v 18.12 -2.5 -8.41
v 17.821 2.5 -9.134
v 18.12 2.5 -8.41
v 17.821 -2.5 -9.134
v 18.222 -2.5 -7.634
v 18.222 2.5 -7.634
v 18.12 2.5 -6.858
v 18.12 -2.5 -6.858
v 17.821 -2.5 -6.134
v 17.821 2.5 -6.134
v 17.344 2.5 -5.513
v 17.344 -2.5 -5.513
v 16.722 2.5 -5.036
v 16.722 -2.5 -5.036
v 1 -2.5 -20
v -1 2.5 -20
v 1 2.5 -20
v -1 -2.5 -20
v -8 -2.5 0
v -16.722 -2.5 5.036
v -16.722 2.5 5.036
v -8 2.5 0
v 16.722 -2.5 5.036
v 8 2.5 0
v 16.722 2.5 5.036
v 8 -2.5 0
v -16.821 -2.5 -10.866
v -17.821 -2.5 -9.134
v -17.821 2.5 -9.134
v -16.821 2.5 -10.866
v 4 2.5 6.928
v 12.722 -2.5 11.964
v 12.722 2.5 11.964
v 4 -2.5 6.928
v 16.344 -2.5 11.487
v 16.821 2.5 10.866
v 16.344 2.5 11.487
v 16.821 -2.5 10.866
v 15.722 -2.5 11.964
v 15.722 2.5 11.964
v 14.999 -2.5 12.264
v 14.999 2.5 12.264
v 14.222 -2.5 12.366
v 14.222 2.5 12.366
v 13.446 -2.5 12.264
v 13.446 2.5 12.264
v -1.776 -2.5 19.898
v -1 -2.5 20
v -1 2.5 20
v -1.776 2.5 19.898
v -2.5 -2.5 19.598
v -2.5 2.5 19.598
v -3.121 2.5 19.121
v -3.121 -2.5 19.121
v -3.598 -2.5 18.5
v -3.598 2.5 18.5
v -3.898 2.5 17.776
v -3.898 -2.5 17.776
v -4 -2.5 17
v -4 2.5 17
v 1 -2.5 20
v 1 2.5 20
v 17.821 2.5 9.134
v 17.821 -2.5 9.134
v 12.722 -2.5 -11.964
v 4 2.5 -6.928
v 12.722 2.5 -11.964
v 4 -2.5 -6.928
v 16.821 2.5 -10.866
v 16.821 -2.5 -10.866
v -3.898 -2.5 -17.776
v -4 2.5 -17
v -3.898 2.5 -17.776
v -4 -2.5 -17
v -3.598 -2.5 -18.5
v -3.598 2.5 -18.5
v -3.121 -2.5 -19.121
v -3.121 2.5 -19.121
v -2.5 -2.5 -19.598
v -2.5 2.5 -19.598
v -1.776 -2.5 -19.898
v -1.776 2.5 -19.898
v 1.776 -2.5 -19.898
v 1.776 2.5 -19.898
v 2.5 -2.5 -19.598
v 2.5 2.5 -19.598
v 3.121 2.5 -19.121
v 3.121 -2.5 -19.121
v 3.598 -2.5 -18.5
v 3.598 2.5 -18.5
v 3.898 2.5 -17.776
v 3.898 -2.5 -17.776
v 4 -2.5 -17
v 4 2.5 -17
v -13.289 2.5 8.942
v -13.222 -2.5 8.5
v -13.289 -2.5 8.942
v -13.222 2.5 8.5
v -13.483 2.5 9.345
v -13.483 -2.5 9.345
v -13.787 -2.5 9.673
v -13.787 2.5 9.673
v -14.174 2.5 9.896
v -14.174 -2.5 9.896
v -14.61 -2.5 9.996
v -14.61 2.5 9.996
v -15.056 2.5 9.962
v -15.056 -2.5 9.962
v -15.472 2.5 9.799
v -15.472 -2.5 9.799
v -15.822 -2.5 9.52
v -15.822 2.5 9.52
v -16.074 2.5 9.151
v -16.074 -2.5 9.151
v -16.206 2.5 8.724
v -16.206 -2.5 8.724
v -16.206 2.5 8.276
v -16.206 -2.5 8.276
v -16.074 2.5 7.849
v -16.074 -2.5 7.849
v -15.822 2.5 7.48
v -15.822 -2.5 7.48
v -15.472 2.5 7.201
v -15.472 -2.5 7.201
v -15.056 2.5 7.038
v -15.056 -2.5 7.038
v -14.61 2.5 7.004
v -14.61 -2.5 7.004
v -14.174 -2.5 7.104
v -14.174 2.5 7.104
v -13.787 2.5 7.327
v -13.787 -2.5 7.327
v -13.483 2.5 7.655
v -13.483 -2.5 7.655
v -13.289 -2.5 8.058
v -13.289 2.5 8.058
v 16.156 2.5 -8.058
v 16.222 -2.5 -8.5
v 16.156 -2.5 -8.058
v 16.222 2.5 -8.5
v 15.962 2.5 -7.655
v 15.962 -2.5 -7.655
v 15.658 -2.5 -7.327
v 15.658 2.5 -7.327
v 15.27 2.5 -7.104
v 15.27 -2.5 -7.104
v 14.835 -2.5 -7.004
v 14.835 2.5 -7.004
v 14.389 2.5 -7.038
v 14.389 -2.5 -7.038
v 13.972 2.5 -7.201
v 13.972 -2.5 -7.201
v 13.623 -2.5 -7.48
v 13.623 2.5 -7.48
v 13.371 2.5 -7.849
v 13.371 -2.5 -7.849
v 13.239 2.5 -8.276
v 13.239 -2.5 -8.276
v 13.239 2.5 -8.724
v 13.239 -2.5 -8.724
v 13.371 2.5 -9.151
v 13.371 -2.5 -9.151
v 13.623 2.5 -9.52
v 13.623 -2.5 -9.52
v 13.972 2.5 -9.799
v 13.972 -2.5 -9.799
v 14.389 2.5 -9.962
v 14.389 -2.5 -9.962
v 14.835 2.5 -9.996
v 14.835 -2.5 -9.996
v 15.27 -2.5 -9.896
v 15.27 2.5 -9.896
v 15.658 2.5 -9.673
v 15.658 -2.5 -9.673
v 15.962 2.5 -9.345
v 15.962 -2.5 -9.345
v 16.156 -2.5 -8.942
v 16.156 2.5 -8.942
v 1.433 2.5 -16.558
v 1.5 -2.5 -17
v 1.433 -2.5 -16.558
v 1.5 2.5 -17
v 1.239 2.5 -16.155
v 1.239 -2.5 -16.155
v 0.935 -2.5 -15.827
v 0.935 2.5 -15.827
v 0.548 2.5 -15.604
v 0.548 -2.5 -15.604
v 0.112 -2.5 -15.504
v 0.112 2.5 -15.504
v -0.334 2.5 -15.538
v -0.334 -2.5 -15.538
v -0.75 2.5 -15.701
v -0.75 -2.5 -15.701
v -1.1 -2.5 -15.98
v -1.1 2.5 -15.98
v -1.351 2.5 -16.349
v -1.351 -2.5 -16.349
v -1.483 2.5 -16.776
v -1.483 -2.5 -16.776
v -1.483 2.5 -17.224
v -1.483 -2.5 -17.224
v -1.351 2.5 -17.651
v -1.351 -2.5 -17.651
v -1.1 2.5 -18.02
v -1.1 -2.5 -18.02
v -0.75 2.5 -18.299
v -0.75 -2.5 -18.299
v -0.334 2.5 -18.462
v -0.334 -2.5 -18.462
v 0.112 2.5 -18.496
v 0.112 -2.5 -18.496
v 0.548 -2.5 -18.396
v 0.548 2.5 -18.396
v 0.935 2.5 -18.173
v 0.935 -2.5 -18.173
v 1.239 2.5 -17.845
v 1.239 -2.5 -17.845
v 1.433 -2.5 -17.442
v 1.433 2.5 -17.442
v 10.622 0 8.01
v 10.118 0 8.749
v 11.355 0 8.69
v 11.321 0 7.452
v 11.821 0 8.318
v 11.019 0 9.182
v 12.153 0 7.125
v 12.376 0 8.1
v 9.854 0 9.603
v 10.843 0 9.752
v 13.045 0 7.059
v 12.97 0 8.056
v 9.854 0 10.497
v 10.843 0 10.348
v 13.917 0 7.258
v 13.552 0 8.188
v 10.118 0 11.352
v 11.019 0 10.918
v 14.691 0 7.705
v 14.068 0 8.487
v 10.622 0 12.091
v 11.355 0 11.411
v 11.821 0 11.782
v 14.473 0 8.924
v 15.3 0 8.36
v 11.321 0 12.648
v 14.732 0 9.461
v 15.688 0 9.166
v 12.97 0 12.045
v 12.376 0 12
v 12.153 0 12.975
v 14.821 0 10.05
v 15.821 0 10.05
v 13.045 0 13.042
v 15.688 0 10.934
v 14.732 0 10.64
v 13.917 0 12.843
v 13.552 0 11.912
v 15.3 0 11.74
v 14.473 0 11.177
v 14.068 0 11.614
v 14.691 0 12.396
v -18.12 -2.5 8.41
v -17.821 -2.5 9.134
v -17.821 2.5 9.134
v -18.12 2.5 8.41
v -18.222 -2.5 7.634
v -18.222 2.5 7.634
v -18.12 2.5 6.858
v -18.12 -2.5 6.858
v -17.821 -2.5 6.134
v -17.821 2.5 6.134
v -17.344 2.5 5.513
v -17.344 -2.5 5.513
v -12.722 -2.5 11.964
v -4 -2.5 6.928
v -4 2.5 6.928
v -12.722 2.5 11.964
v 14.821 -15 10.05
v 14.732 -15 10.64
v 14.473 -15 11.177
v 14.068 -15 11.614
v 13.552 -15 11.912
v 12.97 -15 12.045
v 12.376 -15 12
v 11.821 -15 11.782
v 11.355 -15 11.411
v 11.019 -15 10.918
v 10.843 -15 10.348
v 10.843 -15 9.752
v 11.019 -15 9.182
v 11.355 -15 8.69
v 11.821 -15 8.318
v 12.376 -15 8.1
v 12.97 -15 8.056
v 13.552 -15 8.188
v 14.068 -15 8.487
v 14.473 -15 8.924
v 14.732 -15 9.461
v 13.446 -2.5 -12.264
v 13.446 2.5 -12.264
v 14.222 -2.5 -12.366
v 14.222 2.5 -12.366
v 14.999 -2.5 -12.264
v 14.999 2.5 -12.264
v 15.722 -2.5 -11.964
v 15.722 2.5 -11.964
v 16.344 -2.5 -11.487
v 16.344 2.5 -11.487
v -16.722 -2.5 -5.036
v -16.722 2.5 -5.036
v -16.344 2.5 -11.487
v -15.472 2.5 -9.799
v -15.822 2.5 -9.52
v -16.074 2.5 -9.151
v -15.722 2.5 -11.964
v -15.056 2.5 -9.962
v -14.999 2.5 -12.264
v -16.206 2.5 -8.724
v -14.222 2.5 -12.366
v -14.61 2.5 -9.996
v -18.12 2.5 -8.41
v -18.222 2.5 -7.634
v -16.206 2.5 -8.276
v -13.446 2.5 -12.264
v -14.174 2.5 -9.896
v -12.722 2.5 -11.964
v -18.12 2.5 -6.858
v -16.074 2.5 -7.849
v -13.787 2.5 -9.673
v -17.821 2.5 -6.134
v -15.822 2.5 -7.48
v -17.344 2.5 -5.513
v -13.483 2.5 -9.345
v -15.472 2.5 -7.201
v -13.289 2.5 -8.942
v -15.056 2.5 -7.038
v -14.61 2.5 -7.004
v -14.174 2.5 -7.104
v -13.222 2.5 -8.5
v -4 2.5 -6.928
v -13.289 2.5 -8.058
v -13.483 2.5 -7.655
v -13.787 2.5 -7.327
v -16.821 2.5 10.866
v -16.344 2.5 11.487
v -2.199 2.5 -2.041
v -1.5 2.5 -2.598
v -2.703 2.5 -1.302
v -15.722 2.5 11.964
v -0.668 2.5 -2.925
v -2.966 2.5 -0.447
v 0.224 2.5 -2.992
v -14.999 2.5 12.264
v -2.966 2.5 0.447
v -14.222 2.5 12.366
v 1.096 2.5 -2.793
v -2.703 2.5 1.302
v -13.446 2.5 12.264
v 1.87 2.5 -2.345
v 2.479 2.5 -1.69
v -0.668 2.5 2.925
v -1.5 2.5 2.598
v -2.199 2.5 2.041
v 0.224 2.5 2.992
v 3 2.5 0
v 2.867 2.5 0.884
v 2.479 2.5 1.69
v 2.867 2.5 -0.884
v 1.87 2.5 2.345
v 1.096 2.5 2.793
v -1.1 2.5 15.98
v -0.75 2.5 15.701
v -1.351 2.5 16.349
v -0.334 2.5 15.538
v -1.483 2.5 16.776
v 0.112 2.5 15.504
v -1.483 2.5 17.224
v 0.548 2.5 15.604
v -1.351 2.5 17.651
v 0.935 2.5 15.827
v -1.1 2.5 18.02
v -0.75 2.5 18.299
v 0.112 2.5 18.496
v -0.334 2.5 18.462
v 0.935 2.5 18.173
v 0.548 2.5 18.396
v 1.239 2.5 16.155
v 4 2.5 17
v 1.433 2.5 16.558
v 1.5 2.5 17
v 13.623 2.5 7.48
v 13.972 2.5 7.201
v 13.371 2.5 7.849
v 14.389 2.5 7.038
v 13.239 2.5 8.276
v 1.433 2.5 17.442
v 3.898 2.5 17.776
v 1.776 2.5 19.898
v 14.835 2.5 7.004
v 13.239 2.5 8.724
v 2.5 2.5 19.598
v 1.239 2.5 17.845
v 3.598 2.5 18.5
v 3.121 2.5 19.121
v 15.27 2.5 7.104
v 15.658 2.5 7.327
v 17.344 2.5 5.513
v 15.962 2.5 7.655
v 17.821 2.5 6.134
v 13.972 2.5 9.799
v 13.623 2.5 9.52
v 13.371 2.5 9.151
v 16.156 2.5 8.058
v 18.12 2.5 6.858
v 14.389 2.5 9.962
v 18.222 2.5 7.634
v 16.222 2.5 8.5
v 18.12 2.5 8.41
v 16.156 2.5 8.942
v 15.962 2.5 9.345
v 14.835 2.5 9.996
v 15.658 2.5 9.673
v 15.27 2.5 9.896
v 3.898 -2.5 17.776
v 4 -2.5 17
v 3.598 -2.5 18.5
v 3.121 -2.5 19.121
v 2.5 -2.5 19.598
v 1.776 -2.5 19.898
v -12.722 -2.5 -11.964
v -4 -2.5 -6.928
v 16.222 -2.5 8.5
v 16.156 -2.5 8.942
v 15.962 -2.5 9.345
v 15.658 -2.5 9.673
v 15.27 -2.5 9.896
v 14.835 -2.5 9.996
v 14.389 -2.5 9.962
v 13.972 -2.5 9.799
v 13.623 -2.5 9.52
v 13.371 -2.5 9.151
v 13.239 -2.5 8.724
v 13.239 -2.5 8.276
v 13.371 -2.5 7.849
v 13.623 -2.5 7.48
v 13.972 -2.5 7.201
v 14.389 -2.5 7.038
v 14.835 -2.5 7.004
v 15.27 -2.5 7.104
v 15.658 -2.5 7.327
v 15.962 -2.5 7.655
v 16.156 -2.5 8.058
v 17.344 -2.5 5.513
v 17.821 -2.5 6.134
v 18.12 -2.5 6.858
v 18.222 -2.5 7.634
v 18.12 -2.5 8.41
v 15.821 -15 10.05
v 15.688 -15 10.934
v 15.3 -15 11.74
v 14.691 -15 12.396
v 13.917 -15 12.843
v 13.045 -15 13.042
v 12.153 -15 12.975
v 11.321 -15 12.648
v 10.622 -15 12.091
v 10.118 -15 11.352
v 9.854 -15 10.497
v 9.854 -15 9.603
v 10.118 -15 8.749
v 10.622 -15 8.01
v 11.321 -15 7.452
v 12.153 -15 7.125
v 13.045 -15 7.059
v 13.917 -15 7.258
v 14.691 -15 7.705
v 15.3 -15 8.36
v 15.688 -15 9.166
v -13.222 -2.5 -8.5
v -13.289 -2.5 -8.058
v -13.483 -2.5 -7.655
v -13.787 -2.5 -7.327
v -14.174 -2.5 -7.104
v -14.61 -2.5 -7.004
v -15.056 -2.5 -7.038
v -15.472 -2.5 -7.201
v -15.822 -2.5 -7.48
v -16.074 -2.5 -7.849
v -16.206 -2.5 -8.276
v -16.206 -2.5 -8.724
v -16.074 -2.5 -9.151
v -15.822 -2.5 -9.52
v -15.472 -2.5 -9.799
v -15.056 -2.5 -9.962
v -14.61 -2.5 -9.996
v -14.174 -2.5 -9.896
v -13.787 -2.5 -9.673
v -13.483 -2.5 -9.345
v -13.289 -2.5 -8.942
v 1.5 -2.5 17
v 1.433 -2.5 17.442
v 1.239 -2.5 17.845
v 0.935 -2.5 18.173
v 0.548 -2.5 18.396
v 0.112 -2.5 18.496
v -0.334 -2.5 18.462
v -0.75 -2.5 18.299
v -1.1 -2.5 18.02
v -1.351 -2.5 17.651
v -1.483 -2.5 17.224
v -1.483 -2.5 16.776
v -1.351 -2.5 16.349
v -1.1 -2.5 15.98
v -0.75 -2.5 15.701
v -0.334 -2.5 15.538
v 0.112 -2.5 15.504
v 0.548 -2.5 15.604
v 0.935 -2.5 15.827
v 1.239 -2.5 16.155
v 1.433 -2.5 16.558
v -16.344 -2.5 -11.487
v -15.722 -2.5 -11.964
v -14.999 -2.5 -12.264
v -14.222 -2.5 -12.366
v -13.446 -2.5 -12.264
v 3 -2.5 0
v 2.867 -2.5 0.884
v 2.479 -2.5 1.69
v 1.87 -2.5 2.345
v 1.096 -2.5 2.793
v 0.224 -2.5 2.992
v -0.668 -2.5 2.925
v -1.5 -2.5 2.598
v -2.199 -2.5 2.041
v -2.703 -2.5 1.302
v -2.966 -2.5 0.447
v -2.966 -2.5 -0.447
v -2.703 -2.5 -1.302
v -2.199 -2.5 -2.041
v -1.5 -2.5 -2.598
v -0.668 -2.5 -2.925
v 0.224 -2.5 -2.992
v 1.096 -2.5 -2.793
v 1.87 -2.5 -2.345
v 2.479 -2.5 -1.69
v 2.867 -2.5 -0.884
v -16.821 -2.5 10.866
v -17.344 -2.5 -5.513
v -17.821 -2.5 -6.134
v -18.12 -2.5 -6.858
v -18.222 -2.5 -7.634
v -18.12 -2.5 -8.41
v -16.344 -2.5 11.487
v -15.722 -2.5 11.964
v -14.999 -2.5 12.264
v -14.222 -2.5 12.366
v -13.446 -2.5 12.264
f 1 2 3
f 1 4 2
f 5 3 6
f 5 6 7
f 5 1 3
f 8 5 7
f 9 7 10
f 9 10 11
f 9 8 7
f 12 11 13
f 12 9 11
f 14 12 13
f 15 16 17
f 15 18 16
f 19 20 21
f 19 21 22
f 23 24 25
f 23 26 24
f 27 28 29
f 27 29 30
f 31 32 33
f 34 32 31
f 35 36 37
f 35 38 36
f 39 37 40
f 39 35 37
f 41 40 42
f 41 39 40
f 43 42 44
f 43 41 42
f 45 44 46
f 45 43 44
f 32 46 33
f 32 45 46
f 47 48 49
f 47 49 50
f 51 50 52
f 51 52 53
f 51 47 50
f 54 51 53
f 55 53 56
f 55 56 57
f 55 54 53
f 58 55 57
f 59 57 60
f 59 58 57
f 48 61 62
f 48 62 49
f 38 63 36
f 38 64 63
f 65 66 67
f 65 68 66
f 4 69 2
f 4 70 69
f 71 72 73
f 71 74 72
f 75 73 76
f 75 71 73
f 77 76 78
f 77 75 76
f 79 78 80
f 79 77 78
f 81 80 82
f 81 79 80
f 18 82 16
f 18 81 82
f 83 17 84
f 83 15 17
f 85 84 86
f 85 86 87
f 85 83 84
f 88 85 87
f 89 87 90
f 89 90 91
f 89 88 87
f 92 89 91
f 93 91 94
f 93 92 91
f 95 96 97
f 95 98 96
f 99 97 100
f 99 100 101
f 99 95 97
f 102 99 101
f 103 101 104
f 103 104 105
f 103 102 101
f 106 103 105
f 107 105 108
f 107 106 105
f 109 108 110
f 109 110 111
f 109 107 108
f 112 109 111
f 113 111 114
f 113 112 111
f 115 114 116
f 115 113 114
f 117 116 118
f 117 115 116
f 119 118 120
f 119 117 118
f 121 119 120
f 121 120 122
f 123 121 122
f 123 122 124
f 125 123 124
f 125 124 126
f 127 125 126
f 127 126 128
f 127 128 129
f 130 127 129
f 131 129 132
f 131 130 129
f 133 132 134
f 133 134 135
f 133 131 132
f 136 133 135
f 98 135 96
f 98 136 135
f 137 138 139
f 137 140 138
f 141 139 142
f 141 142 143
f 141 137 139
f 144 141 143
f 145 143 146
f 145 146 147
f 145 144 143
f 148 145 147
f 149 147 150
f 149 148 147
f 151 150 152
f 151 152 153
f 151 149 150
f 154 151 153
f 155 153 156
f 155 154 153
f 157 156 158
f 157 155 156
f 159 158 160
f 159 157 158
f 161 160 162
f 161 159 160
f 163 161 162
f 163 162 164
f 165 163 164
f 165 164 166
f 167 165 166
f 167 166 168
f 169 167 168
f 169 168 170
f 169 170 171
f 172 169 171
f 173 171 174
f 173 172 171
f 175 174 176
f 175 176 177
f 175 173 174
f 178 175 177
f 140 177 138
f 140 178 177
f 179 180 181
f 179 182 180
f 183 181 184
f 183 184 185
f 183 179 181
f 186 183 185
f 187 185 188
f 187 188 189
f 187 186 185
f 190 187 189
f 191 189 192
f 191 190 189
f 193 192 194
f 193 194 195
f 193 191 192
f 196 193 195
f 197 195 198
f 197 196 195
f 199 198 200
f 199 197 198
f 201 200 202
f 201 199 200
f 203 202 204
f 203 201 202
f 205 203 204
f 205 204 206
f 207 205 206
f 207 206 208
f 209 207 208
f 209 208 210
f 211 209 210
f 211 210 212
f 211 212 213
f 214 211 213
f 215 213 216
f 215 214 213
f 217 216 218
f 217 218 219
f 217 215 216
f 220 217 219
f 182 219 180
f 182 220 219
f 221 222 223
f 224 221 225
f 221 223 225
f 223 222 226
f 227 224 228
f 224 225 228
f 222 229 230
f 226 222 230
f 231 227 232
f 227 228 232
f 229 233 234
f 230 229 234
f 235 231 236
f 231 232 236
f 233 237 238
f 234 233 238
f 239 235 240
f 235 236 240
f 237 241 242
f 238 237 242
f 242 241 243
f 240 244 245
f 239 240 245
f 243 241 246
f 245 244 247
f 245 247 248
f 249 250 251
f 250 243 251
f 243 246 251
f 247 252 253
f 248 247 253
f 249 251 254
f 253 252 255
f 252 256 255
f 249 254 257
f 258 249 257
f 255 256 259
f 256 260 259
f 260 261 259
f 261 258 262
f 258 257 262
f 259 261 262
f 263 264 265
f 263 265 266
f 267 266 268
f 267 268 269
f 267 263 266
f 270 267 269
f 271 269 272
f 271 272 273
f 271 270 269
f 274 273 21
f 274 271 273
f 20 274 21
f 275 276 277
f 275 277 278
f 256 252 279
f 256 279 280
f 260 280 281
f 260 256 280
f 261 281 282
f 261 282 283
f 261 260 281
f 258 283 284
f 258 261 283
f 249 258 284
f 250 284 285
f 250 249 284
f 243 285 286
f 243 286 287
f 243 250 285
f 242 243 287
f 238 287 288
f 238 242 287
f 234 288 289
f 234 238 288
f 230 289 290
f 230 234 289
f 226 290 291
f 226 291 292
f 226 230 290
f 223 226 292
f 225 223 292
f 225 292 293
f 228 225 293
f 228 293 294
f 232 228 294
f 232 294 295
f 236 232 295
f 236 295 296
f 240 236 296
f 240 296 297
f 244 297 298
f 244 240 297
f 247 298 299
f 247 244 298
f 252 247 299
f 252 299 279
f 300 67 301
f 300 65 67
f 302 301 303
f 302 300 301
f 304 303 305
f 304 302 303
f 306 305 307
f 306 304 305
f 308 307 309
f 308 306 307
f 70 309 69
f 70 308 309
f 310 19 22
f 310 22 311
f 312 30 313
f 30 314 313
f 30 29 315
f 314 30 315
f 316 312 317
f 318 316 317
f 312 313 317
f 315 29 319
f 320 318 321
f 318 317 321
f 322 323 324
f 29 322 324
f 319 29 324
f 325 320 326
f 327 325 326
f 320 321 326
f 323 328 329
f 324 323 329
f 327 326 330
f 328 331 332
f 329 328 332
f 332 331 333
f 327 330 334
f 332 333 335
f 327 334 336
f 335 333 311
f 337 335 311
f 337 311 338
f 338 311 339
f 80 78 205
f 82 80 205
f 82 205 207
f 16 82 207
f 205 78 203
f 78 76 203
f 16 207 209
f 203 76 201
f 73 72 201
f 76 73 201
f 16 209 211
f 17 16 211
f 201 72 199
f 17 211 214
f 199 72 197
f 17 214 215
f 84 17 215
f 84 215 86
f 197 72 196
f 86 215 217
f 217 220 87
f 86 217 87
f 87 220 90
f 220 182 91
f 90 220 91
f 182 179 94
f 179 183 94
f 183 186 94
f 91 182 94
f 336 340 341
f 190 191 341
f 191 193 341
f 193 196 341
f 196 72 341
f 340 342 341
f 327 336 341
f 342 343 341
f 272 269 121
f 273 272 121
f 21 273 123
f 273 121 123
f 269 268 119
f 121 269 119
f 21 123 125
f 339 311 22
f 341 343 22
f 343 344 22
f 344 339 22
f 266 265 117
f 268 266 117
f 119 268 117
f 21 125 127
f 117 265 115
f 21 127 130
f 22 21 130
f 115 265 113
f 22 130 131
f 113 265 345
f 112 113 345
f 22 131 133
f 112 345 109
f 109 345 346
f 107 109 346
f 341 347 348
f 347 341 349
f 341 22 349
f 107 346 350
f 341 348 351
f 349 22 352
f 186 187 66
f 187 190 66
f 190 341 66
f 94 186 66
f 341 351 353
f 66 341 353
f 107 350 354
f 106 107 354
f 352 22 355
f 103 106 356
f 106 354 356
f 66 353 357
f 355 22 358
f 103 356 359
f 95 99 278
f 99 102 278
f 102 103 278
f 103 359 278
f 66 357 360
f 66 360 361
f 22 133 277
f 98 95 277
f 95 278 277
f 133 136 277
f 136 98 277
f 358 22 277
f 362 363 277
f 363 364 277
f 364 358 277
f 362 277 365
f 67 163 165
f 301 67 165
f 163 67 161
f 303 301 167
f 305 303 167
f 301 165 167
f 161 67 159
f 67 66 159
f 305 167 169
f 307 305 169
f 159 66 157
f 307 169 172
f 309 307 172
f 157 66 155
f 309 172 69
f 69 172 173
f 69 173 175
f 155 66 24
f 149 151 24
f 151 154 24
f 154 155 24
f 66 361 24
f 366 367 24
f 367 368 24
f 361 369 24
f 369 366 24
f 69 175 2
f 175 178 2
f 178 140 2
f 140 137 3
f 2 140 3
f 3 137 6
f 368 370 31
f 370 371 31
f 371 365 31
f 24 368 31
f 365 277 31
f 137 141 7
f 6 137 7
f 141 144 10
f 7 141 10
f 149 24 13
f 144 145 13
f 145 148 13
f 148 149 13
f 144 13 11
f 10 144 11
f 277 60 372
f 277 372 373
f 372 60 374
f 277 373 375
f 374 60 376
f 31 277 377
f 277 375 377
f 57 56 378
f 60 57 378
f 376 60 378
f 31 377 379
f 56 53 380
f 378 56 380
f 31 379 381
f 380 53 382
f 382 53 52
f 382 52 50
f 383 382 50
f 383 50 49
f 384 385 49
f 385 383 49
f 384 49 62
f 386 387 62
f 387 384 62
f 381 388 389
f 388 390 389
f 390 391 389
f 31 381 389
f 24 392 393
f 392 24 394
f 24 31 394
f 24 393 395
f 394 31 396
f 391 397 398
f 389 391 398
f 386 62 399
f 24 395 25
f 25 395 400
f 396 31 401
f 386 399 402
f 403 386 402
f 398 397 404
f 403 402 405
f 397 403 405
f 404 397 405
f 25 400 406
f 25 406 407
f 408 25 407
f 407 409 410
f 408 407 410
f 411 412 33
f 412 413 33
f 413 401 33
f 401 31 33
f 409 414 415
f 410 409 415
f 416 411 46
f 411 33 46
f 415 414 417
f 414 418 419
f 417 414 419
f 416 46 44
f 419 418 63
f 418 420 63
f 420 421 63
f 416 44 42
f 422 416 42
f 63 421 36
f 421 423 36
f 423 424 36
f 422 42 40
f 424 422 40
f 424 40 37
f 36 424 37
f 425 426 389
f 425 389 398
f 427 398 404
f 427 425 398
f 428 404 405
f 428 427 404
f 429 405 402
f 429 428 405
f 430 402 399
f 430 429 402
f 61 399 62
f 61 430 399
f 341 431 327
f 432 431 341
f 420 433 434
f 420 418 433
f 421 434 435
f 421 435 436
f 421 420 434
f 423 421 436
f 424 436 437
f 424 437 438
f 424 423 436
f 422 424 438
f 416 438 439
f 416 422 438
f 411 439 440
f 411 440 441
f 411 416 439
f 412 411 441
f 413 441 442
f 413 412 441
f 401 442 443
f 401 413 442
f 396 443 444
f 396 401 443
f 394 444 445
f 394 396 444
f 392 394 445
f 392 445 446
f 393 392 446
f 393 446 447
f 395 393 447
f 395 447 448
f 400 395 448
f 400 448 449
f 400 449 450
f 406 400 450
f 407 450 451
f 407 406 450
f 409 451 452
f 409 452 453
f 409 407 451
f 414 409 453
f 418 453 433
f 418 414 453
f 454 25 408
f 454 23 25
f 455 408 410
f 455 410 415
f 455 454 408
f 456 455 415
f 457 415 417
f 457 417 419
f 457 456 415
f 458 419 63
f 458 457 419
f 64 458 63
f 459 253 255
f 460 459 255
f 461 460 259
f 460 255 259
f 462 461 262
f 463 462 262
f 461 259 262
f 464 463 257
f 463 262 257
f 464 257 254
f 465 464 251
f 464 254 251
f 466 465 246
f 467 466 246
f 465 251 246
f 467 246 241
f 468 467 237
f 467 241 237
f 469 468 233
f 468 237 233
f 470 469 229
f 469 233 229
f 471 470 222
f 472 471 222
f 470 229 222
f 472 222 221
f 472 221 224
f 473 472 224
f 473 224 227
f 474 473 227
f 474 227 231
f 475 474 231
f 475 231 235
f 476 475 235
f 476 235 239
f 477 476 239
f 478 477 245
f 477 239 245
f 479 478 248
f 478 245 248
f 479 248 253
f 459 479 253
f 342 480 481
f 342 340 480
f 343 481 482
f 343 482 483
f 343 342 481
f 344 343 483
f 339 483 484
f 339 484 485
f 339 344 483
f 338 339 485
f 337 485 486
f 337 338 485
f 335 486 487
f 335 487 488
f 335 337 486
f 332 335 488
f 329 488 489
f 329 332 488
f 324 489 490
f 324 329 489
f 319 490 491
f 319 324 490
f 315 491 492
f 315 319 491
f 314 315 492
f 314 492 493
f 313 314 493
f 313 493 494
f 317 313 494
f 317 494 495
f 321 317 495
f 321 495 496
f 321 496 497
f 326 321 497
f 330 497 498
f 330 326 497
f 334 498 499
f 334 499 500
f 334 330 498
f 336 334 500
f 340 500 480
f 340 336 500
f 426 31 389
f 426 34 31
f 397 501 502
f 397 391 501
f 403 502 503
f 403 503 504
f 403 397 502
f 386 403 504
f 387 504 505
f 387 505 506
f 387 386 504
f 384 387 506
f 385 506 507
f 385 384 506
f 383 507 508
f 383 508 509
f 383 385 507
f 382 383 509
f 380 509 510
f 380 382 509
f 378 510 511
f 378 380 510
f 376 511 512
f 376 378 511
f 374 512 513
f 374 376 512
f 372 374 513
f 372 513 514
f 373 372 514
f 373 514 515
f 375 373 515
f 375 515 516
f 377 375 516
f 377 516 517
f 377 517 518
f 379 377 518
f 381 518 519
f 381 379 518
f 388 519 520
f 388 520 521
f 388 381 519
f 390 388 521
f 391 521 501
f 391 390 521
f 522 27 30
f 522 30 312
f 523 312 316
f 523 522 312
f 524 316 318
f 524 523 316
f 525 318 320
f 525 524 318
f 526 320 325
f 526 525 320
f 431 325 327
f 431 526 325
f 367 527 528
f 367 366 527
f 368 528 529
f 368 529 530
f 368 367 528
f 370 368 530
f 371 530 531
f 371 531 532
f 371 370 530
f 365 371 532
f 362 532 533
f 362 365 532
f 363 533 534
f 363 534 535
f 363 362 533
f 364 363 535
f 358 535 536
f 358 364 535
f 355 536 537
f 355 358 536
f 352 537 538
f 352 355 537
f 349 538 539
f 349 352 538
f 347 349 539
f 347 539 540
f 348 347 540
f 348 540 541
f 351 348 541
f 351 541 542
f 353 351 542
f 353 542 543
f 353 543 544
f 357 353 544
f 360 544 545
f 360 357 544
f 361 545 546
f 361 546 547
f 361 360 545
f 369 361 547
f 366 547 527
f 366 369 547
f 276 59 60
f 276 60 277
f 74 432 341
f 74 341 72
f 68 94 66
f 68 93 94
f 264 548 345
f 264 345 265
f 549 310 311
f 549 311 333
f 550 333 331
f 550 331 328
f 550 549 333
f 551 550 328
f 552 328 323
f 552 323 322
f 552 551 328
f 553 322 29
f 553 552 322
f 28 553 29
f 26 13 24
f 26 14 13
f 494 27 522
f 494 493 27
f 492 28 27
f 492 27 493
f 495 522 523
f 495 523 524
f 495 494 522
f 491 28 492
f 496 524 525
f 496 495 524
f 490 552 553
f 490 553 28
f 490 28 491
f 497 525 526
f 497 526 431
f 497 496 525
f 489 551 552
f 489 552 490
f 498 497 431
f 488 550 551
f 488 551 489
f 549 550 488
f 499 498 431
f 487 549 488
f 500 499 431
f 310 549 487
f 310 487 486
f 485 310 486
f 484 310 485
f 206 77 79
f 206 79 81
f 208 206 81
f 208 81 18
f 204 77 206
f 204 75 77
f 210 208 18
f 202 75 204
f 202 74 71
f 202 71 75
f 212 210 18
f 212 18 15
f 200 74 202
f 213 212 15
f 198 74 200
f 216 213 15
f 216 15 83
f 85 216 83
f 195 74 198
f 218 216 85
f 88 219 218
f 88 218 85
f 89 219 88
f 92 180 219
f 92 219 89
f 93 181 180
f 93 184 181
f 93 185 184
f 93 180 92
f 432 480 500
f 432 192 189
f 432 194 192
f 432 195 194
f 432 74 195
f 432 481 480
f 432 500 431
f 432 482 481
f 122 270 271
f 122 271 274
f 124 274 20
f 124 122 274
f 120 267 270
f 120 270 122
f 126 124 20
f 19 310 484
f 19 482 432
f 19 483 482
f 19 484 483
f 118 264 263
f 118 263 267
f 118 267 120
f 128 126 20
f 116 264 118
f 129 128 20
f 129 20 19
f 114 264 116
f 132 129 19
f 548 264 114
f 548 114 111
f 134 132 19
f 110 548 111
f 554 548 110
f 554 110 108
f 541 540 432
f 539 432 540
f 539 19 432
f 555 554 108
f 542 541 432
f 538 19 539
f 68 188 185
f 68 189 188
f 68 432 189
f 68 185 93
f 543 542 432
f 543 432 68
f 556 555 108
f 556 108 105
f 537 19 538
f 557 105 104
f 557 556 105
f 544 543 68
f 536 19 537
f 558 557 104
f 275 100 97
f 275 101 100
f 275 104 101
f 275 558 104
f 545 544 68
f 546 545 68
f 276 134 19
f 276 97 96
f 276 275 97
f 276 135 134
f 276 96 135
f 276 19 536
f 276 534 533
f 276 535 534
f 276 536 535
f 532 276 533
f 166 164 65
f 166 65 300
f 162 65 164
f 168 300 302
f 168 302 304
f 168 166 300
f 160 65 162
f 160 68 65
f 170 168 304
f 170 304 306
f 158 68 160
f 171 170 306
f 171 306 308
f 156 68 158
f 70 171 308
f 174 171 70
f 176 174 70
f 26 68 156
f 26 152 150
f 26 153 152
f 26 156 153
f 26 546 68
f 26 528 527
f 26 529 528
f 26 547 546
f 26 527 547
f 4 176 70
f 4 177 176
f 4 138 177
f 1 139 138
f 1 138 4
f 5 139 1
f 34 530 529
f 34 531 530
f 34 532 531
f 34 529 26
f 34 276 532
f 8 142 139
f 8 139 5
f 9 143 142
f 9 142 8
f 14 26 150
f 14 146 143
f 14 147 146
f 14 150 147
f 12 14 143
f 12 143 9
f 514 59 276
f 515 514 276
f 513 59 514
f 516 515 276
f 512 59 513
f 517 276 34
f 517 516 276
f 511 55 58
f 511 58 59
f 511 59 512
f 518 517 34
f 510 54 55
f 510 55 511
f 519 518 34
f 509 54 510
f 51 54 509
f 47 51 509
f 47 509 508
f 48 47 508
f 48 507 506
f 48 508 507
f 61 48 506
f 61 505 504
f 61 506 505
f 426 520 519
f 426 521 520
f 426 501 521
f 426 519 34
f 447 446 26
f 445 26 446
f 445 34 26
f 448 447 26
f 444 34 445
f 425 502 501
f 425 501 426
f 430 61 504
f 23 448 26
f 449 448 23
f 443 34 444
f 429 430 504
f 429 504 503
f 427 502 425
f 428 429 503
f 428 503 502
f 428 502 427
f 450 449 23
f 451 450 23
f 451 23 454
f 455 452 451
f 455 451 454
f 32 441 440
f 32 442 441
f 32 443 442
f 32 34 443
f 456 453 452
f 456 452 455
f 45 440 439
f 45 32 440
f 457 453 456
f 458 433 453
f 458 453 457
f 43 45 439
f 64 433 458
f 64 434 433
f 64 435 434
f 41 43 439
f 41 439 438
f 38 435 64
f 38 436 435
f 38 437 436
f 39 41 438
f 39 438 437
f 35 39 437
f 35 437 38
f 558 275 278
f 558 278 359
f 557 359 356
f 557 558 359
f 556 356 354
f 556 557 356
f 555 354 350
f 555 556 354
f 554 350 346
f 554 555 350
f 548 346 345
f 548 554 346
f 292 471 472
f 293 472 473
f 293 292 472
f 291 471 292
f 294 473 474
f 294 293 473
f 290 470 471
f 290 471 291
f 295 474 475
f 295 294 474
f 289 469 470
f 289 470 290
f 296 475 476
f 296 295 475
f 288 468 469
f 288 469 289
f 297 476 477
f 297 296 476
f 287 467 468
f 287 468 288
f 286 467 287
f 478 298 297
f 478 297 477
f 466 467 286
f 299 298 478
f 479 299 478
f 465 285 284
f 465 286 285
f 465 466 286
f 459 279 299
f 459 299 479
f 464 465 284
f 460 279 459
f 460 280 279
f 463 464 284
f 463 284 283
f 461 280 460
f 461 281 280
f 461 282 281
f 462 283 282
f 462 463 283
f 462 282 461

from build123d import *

# Parameters (mm, degrees)
F0_R     = 1.5
F0_R_2   = 3
F1_DEPTH = 2.5
F2_R     = 4.5
F2_R_2   = 3
F3_DEPTH = 5.5
F5_R     = 3
F5_R_2   = 2
F6_DEPTH = 15


with BuildPart() as f1:
    # F0 (on Front) → F1 (new body, symmetric)
    with BuildSketch(Plane.XZ):
        with BuildLine():
            Line((4, 6.928203), (4, 17))
            ThreePointArc((4, 17), (3.12132, 19.12132), (1, 20))
            Line((1, 20), (-1, 20))
            ThreePointArc((-1, 20), (-3.12132, 19.12132), (-4, 17))
            Line((-4, 17), (-4, 6.928203))
            Line((-4, 6.928203), (-12.722432, 11.964102))
            ThreePointArc((-12.722432, 11.964102), (-14.998889, 12.263803), (-16.820508, 10.866025))
            Line((-16.820508, 10.866025), (-17.820508, 9.133975))
            ThreePointArc((-17.820508, 9.133975), (-18.120209, 6.857517), (-16.722432, 5.035898))
            Line((-16.722432, 5.035898), (-8, 0))
            Line((-8, 0), (-16.722432, -5.035898))
            ThreePointArc((-16.722432, -5.035898), (-18.120209, -6.857517), (-17.820508, -9.133975))
            Line((-17.820508, -9.133975), (-16.820508, -10.866025))
            ThreePointArc((-16.820508, -10.866025), (-14.998889, -12.263803), (-12.722432, -11.964102))
            Line((-12.722432, -11.964102), (-4, -6.928203))
            Line((-4, -6.928203), (-4, -17))
            ThreePointArc((-4, -17), (-3.12132, -19.12132), (-1, -20))
            Line((-1, -20), (1, -20))
            ThreePointArc((1, -20), (3.12132, -19.12132), (4, -17))
            Line((4, -17), (4, -6.928203))
            Line((4, -6.928203), (12.722432, -11.964102))
            ThreePointArc((12.722432, -11.964102), (14.998889, -12.263803), (16.820508, -10.866025))
            Line((16.820508, -10.866025), (17.820508, -9.133975))
            ThreePointArc((17.820508, -9.133975), (18.120209, -6.857517), (16.722432, -5.035898))
            Line((16.722432, -5.035898), (8, 0))
            Line((8, 0), (16.722432, 5.035898))
            ThreePointArc((16.722432, 5.035898), (18.120209, 6.857517), (17.820508, 9.133975))
            Line((17.820508, 9.133975), (16.820508, 10.866025))
            ThreePointArc((16.820508, 10.866025), (14.998889, 12.263803), (12.722432, 11.964102))
            Line((12.722432, 11.964102), (4, 6.928203))
        make_face()
        with Locations((-14.722432, -8.5)):
            Circle(F0_R, mode=Mode.SUBTRACT)
        with Locations((0, -17)):
            Circle(F0_R, mode=Mode.SUBTRACT)
        with Locations((14.722432, -8.5)):
            Circle(F0_R, mode=Mode.SUBTRACT)
        with Locations((-14.722432, 8.5)):
            Circle(F0_R, mode=Mode.SUBTRACT)
        Circle(F0_R_2, mode=Mode.SUBTRACT)
        with Locations((14.722432, 8.5)):
            Circle(F0_R, mode=Mode.SUBTRACT)
        with Locations((0, 17)):
            Circle(F0_R, mode=Mode.SUBTRACT)
    extrude(amount=F1_DEPTH, both=True)


with BuildPart() as f3:
    # F2 (on Front) → F3 (new body)
    with BuildSketch(Plane.XZ):
        with Locations((-21.388192, 23.641713)):
            Circle(F2_R)
        with Locations((-21.388192, 23.641713)):
            Circle(F2_R_2, mode=Mode.SUBTRACT)
    extrude(amount=F3_DEPTH)


with BuildPart() as f6:
    # F5 (on Front) → F6 (new body)
    with BuildSketch(Plane.XZ):
        with Locations((12.820849, 10.050187)):
            Circle(F5_R)
        with Locations((12.820849, 10.050187)):
            Circle(F5_R_2, mode=Mode.SUBTRACT)
    extrude(amount=F6_DEPTH)


solid = Compound([f1.part, f6.part])
